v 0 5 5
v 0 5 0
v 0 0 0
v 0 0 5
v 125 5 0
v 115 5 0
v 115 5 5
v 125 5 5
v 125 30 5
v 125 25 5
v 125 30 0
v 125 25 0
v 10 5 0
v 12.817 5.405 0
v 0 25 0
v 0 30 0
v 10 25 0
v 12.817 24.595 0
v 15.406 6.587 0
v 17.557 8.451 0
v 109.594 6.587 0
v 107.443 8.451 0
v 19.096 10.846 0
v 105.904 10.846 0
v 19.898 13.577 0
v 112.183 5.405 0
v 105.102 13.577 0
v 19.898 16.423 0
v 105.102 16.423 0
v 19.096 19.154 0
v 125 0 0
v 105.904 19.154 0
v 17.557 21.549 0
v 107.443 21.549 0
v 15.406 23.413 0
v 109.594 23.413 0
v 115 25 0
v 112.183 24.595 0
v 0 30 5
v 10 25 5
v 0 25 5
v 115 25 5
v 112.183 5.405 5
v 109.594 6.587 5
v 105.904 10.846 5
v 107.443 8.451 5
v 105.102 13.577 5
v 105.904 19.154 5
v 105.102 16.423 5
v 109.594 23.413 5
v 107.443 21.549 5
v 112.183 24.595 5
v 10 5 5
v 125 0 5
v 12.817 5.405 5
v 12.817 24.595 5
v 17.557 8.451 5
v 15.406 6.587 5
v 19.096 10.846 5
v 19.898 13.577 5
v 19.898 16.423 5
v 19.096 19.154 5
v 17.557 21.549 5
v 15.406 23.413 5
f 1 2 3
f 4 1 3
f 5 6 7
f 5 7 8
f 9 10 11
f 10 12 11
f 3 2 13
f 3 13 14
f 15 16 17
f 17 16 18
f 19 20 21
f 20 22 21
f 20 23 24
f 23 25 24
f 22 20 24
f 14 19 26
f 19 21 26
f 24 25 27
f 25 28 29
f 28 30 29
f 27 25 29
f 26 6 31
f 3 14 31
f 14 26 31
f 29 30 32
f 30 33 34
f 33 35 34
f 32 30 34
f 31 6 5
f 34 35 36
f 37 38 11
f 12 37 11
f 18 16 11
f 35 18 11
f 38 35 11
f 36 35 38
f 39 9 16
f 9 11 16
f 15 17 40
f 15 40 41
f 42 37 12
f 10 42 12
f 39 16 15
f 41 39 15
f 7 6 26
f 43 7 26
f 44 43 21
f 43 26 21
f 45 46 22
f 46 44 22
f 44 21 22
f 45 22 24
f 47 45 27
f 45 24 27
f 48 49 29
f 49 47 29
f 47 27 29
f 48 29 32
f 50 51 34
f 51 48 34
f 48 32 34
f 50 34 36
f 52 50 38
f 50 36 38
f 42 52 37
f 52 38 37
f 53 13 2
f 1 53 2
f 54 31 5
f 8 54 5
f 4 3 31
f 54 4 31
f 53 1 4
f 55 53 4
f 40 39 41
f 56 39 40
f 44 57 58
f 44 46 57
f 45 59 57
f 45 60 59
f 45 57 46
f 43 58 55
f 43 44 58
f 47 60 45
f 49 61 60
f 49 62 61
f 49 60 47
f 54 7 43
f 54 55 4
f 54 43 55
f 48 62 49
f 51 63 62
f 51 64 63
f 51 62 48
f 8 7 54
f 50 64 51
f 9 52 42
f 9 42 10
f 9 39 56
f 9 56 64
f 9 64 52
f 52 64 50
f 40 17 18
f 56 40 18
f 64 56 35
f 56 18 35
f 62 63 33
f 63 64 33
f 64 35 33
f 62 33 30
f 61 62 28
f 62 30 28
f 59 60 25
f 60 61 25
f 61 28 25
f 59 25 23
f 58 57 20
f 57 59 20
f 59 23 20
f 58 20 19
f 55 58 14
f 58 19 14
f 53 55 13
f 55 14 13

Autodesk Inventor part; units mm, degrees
ref_plane "YZ Plane" through (0, 0, 0) normal (1, 0, 0) x (0, 1, 0)
ref_plane "XZ Plane" through (0, 0, 0) normal (0, 1, 0) x (-1, 0, 0)
ref_plane "XY Plane" through (0, 0, 0) normal (0, 0, 1) x (1, 0, 0)
sketch "スケッチ1" plane through (0, 0, 0) normal (0, 0, 1) x (1, 0, 0)
  line L0 (0, 0) -> (125, 0)
  line L1 (125, 30) -> (0, 30)
  arc A0 (10, 5) -> (10, 25) centre (10, 15) ccw
  arc A1 (115, 25) -> (115, 5) centre (115, 15) ccw
  line L2 (10, 25) -> (0, 25)
  line L3 (10, 5) -> (0, 5)
  line L4 (115, 25) -> (125, 25)
  line L5 (115, 5) -> (125, 5)
  line L6 (0, 30) -> (0, 25)
  line L7 (0, 5) -> (0, 0)
  line L8 (125, 0) -> (125, 5)
  line L9 (125, 25) -> (125, 30)
  dimension "d0" = 125
  dimension "d1" = 30
  dimension "d2" = 20
  dimension "d3" = 20
  dimension "d7" = 125
  dimension "d9" = 5
  dimension "d12" = 10
  dimension "d15" = 115
extrude "押し出し1" add sketch "スケッチ1" along normal blind 5
properties part number "RescueKit-Slide"
